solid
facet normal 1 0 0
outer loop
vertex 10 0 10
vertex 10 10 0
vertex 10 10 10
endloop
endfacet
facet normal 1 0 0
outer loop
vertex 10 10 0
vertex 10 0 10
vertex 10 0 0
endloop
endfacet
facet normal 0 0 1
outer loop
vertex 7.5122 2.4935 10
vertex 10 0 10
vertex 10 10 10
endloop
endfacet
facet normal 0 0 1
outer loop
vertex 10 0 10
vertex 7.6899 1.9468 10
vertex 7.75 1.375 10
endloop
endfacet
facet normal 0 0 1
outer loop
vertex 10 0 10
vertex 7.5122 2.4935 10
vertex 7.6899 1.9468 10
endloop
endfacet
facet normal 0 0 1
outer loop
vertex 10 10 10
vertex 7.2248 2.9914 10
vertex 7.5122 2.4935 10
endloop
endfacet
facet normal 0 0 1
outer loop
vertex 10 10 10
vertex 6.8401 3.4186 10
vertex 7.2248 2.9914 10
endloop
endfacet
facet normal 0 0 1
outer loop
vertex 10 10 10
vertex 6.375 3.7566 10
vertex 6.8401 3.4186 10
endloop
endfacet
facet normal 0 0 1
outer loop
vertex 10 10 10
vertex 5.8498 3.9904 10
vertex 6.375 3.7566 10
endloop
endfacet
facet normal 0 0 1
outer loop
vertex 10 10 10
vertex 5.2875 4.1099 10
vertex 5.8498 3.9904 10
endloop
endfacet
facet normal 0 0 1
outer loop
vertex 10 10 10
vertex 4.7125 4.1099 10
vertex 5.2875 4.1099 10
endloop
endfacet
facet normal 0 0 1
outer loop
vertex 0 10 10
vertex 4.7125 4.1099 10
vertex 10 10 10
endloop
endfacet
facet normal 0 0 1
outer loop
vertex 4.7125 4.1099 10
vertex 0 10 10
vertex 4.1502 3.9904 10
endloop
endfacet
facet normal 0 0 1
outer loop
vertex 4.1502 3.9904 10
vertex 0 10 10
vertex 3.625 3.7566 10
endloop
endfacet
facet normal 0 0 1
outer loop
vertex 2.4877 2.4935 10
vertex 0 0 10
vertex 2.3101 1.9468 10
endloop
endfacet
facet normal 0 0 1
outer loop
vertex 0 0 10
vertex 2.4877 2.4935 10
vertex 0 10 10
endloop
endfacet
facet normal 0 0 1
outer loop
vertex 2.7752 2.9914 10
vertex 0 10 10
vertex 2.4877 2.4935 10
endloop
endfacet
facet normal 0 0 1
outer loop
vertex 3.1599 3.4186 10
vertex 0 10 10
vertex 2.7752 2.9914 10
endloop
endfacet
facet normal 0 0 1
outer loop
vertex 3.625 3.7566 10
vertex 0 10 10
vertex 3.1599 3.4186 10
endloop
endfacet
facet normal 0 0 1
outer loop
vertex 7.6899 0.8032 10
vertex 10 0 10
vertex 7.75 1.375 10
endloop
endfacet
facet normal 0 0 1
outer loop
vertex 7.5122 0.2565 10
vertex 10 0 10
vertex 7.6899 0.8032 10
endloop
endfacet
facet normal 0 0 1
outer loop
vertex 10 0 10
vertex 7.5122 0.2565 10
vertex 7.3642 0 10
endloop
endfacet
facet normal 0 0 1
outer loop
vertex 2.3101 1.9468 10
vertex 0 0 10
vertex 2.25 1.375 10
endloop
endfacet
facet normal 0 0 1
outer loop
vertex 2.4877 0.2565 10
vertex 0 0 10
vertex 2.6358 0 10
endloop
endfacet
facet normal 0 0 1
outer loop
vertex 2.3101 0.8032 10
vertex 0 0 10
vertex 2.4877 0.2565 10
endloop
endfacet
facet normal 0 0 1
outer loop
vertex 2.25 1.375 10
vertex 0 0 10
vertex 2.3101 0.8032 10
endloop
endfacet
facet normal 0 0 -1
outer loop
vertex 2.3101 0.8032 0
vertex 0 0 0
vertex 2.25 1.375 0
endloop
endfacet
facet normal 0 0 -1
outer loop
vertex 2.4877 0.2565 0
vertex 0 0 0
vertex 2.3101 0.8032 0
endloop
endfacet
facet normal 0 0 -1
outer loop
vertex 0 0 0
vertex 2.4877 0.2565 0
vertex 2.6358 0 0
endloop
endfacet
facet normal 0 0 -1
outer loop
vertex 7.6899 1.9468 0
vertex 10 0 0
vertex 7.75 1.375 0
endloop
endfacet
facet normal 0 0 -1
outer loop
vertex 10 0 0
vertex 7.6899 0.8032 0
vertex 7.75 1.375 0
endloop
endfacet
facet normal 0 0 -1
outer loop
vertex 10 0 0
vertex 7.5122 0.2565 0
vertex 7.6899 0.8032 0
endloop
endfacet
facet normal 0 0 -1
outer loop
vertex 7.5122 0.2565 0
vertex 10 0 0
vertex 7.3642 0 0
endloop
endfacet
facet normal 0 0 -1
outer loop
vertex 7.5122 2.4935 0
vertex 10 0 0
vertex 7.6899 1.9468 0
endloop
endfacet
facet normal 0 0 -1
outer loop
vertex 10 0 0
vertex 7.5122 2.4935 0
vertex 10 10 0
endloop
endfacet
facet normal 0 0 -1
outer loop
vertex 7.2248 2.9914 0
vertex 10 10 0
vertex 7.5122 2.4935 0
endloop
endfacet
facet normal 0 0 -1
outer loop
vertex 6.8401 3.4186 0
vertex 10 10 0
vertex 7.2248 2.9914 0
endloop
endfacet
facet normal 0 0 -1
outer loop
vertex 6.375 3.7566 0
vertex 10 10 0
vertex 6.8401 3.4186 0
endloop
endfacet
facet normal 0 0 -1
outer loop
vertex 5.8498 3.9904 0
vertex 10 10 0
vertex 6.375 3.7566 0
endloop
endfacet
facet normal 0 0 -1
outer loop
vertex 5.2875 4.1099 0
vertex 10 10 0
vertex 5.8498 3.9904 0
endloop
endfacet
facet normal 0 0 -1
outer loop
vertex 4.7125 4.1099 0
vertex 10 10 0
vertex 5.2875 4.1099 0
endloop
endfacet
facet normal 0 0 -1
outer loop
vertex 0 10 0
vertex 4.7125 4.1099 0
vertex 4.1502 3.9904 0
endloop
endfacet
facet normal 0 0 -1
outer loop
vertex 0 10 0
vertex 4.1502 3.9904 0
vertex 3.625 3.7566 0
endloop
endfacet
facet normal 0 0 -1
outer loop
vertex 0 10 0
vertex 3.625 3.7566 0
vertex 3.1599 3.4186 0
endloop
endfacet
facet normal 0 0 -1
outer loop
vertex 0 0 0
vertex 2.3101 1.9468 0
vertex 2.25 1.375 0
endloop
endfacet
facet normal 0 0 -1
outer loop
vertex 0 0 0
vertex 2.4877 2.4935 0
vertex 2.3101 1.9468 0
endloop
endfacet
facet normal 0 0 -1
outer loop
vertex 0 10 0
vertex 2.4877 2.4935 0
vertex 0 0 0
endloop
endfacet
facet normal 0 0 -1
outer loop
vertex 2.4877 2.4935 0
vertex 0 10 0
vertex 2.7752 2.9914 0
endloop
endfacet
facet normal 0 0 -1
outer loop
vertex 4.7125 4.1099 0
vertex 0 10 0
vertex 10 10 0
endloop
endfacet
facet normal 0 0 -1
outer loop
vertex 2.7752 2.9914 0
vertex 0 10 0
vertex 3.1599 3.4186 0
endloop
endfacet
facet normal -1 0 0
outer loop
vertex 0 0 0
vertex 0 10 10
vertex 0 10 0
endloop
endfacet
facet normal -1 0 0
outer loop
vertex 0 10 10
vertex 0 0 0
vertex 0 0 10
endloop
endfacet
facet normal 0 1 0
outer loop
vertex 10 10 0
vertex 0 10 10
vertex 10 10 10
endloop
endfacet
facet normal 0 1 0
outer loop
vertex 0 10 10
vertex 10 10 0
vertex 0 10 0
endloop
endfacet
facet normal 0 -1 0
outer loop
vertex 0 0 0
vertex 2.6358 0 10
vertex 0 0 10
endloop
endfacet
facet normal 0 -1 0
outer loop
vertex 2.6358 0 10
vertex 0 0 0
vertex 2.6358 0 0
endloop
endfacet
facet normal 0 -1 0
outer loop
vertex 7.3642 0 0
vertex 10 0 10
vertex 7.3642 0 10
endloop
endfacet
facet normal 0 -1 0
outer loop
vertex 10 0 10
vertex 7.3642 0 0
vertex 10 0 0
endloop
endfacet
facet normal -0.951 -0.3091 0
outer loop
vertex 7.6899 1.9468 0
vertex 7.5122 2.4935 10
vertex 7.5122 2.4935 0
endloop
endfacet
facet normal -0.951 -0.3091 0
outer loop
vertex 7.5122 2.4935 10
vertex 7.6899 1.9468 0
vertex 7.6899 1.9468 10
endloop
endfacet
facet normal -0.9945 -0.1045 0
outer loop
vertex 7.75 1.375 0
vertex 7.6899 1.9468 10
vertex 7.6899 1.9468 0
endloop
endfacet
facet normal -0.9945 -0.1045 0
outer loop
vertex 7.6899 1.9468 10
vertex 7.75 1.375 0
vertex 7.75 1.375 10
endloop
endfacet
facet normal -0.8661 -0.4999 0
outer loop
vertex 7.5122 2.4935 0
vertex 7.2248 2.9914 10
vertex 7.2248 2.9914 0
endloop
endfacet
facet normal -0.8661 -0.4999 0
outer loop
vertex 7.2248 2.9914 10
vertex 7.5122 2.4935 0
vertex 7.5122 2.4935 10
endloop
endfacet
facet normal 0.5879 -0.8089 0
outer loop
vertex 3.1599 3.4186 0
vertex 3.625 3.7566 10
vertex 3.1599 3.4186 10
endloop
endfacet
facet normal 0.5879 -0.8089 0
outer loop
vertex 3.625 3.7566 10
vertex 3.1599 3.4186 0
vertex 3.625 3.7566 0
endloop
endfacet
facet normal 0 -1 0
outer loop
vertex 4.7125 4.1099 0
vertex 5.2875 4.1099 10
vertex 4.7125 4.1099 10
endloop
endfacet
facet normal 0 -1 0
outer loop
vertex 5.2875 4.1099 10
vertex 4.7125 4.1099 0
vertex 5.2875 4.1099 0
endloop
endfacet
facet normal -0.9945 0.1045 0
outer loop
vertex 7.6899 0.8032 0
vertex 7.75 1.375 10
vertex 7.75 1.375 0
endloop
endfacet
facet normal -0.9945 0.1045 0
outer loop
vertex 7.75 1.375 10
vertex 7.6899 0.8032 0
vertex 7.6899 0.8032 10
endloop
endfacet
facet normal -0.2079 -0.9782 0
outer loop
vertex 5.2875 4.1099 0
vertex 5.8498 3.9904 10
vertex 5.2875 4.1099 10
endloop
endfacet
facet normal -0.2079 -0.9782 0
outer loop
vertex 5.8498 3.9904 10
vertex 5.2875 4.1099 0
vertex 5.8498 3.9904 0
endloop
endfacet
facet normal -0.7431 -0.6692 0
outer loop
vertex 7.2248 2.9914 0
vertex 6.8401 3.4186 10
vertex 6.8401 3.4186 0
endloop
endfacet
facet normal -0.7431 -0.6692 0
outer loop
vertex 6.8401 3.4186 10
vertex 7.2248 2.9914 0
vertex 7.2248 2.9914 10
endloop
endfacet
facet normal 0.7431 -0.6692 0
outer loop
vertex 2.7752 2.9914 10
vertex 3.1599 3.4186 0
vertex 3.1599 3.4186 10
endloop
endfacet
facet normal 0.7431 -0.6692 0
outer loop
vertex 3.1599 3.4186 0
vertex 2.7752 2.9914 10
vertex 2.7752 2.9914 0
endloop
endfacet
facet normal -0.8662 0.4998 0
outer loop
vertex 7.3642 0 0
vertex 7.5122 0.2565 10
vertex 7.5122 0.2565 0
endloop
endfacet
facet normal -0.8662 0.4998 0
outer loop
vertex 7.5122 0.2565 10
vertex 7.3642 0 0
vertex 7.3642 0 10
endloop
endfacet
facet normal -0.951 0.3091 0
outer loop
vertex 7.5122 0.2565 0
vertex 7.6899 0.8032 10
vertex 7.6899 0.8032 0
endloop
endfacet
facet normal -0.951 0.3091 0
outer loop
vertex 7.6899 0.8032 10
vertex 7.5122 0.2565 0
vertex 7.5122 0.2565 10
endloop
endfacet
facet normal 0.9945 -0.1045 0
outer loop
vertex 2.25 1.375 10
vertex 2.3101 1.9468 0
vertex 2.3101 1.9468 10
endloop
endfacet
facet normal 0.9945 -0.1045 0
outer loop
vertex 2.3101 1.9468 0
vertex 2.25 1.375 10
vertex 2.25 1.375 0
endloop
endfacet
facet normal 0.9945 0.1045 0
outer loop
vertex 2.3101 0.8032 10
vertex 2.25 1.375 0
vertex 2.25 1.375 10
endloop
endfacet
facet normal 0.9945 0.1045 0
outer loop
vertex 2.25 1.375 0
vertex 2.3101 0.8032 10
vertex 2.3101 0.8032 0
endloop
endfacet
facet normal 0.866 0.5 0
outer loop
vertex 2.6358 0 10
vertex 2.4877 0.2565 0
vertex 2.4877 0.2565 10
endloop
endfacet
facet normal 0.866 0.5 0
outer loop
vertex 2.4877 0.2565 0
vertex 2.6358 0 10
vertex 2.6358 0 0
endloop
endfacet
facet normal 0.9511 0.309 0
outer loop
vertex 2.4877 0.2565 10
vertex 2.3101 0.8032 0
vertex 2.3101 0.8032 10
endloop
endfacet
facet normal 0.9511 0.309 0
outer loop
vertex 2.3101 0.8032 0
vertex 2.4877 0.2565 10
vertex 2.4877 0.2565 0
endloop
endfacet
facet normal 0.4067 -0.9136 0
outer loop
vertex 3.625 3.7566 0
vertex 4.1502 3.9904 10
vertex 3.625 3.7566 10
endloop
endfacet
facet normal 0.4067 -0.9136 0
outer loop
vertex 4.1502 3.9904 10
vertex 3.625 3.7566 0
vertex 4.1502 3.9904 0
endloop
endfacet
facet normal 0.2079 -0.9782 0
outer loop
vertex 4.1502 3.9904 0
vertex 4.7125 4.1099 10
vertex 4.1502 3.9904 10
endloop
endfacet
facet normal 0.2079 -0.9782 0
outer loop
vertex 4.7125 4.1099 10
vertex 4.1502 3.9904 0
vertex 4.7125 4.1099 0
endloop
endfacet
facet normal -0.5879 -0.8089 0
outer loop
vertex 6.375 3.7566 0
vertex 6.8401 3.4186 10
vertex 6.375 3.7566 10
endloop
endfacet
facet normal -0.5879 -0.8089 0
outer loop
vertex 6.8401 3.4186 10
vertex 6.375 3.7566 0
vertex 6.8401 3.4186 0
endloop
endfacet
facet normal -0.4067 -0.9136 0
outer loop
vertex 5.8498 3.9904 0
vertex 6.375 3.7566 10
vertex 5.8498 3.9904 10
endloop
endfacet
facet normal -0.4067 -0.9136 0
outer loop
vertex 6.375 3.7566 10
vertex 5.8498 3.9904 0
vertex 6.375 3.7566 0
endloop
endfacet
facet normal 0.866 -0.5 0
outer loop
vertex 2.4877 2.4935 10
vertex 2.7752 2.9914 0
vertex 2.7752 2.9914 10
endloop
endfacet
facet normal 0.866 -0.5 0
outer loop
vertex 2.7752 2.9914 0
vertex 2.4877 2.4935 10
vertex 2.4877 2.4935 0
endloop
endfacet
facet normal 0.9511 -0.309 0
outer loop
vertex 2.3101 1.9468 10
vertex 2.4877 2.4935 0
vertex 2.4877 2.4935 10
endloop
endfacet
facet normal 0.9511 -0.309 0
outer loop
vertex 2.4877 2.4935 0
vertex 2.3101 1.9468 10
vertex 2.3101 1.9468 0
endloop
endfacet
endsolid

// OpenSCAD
echo(version=version());


$fs=0.5;
difference() {
  cube([10,10,10]);
  translate([10/2, 5.5/4, -0.5]) {
    cylinder(d=5.5, h=11, center=false);
  }
}
